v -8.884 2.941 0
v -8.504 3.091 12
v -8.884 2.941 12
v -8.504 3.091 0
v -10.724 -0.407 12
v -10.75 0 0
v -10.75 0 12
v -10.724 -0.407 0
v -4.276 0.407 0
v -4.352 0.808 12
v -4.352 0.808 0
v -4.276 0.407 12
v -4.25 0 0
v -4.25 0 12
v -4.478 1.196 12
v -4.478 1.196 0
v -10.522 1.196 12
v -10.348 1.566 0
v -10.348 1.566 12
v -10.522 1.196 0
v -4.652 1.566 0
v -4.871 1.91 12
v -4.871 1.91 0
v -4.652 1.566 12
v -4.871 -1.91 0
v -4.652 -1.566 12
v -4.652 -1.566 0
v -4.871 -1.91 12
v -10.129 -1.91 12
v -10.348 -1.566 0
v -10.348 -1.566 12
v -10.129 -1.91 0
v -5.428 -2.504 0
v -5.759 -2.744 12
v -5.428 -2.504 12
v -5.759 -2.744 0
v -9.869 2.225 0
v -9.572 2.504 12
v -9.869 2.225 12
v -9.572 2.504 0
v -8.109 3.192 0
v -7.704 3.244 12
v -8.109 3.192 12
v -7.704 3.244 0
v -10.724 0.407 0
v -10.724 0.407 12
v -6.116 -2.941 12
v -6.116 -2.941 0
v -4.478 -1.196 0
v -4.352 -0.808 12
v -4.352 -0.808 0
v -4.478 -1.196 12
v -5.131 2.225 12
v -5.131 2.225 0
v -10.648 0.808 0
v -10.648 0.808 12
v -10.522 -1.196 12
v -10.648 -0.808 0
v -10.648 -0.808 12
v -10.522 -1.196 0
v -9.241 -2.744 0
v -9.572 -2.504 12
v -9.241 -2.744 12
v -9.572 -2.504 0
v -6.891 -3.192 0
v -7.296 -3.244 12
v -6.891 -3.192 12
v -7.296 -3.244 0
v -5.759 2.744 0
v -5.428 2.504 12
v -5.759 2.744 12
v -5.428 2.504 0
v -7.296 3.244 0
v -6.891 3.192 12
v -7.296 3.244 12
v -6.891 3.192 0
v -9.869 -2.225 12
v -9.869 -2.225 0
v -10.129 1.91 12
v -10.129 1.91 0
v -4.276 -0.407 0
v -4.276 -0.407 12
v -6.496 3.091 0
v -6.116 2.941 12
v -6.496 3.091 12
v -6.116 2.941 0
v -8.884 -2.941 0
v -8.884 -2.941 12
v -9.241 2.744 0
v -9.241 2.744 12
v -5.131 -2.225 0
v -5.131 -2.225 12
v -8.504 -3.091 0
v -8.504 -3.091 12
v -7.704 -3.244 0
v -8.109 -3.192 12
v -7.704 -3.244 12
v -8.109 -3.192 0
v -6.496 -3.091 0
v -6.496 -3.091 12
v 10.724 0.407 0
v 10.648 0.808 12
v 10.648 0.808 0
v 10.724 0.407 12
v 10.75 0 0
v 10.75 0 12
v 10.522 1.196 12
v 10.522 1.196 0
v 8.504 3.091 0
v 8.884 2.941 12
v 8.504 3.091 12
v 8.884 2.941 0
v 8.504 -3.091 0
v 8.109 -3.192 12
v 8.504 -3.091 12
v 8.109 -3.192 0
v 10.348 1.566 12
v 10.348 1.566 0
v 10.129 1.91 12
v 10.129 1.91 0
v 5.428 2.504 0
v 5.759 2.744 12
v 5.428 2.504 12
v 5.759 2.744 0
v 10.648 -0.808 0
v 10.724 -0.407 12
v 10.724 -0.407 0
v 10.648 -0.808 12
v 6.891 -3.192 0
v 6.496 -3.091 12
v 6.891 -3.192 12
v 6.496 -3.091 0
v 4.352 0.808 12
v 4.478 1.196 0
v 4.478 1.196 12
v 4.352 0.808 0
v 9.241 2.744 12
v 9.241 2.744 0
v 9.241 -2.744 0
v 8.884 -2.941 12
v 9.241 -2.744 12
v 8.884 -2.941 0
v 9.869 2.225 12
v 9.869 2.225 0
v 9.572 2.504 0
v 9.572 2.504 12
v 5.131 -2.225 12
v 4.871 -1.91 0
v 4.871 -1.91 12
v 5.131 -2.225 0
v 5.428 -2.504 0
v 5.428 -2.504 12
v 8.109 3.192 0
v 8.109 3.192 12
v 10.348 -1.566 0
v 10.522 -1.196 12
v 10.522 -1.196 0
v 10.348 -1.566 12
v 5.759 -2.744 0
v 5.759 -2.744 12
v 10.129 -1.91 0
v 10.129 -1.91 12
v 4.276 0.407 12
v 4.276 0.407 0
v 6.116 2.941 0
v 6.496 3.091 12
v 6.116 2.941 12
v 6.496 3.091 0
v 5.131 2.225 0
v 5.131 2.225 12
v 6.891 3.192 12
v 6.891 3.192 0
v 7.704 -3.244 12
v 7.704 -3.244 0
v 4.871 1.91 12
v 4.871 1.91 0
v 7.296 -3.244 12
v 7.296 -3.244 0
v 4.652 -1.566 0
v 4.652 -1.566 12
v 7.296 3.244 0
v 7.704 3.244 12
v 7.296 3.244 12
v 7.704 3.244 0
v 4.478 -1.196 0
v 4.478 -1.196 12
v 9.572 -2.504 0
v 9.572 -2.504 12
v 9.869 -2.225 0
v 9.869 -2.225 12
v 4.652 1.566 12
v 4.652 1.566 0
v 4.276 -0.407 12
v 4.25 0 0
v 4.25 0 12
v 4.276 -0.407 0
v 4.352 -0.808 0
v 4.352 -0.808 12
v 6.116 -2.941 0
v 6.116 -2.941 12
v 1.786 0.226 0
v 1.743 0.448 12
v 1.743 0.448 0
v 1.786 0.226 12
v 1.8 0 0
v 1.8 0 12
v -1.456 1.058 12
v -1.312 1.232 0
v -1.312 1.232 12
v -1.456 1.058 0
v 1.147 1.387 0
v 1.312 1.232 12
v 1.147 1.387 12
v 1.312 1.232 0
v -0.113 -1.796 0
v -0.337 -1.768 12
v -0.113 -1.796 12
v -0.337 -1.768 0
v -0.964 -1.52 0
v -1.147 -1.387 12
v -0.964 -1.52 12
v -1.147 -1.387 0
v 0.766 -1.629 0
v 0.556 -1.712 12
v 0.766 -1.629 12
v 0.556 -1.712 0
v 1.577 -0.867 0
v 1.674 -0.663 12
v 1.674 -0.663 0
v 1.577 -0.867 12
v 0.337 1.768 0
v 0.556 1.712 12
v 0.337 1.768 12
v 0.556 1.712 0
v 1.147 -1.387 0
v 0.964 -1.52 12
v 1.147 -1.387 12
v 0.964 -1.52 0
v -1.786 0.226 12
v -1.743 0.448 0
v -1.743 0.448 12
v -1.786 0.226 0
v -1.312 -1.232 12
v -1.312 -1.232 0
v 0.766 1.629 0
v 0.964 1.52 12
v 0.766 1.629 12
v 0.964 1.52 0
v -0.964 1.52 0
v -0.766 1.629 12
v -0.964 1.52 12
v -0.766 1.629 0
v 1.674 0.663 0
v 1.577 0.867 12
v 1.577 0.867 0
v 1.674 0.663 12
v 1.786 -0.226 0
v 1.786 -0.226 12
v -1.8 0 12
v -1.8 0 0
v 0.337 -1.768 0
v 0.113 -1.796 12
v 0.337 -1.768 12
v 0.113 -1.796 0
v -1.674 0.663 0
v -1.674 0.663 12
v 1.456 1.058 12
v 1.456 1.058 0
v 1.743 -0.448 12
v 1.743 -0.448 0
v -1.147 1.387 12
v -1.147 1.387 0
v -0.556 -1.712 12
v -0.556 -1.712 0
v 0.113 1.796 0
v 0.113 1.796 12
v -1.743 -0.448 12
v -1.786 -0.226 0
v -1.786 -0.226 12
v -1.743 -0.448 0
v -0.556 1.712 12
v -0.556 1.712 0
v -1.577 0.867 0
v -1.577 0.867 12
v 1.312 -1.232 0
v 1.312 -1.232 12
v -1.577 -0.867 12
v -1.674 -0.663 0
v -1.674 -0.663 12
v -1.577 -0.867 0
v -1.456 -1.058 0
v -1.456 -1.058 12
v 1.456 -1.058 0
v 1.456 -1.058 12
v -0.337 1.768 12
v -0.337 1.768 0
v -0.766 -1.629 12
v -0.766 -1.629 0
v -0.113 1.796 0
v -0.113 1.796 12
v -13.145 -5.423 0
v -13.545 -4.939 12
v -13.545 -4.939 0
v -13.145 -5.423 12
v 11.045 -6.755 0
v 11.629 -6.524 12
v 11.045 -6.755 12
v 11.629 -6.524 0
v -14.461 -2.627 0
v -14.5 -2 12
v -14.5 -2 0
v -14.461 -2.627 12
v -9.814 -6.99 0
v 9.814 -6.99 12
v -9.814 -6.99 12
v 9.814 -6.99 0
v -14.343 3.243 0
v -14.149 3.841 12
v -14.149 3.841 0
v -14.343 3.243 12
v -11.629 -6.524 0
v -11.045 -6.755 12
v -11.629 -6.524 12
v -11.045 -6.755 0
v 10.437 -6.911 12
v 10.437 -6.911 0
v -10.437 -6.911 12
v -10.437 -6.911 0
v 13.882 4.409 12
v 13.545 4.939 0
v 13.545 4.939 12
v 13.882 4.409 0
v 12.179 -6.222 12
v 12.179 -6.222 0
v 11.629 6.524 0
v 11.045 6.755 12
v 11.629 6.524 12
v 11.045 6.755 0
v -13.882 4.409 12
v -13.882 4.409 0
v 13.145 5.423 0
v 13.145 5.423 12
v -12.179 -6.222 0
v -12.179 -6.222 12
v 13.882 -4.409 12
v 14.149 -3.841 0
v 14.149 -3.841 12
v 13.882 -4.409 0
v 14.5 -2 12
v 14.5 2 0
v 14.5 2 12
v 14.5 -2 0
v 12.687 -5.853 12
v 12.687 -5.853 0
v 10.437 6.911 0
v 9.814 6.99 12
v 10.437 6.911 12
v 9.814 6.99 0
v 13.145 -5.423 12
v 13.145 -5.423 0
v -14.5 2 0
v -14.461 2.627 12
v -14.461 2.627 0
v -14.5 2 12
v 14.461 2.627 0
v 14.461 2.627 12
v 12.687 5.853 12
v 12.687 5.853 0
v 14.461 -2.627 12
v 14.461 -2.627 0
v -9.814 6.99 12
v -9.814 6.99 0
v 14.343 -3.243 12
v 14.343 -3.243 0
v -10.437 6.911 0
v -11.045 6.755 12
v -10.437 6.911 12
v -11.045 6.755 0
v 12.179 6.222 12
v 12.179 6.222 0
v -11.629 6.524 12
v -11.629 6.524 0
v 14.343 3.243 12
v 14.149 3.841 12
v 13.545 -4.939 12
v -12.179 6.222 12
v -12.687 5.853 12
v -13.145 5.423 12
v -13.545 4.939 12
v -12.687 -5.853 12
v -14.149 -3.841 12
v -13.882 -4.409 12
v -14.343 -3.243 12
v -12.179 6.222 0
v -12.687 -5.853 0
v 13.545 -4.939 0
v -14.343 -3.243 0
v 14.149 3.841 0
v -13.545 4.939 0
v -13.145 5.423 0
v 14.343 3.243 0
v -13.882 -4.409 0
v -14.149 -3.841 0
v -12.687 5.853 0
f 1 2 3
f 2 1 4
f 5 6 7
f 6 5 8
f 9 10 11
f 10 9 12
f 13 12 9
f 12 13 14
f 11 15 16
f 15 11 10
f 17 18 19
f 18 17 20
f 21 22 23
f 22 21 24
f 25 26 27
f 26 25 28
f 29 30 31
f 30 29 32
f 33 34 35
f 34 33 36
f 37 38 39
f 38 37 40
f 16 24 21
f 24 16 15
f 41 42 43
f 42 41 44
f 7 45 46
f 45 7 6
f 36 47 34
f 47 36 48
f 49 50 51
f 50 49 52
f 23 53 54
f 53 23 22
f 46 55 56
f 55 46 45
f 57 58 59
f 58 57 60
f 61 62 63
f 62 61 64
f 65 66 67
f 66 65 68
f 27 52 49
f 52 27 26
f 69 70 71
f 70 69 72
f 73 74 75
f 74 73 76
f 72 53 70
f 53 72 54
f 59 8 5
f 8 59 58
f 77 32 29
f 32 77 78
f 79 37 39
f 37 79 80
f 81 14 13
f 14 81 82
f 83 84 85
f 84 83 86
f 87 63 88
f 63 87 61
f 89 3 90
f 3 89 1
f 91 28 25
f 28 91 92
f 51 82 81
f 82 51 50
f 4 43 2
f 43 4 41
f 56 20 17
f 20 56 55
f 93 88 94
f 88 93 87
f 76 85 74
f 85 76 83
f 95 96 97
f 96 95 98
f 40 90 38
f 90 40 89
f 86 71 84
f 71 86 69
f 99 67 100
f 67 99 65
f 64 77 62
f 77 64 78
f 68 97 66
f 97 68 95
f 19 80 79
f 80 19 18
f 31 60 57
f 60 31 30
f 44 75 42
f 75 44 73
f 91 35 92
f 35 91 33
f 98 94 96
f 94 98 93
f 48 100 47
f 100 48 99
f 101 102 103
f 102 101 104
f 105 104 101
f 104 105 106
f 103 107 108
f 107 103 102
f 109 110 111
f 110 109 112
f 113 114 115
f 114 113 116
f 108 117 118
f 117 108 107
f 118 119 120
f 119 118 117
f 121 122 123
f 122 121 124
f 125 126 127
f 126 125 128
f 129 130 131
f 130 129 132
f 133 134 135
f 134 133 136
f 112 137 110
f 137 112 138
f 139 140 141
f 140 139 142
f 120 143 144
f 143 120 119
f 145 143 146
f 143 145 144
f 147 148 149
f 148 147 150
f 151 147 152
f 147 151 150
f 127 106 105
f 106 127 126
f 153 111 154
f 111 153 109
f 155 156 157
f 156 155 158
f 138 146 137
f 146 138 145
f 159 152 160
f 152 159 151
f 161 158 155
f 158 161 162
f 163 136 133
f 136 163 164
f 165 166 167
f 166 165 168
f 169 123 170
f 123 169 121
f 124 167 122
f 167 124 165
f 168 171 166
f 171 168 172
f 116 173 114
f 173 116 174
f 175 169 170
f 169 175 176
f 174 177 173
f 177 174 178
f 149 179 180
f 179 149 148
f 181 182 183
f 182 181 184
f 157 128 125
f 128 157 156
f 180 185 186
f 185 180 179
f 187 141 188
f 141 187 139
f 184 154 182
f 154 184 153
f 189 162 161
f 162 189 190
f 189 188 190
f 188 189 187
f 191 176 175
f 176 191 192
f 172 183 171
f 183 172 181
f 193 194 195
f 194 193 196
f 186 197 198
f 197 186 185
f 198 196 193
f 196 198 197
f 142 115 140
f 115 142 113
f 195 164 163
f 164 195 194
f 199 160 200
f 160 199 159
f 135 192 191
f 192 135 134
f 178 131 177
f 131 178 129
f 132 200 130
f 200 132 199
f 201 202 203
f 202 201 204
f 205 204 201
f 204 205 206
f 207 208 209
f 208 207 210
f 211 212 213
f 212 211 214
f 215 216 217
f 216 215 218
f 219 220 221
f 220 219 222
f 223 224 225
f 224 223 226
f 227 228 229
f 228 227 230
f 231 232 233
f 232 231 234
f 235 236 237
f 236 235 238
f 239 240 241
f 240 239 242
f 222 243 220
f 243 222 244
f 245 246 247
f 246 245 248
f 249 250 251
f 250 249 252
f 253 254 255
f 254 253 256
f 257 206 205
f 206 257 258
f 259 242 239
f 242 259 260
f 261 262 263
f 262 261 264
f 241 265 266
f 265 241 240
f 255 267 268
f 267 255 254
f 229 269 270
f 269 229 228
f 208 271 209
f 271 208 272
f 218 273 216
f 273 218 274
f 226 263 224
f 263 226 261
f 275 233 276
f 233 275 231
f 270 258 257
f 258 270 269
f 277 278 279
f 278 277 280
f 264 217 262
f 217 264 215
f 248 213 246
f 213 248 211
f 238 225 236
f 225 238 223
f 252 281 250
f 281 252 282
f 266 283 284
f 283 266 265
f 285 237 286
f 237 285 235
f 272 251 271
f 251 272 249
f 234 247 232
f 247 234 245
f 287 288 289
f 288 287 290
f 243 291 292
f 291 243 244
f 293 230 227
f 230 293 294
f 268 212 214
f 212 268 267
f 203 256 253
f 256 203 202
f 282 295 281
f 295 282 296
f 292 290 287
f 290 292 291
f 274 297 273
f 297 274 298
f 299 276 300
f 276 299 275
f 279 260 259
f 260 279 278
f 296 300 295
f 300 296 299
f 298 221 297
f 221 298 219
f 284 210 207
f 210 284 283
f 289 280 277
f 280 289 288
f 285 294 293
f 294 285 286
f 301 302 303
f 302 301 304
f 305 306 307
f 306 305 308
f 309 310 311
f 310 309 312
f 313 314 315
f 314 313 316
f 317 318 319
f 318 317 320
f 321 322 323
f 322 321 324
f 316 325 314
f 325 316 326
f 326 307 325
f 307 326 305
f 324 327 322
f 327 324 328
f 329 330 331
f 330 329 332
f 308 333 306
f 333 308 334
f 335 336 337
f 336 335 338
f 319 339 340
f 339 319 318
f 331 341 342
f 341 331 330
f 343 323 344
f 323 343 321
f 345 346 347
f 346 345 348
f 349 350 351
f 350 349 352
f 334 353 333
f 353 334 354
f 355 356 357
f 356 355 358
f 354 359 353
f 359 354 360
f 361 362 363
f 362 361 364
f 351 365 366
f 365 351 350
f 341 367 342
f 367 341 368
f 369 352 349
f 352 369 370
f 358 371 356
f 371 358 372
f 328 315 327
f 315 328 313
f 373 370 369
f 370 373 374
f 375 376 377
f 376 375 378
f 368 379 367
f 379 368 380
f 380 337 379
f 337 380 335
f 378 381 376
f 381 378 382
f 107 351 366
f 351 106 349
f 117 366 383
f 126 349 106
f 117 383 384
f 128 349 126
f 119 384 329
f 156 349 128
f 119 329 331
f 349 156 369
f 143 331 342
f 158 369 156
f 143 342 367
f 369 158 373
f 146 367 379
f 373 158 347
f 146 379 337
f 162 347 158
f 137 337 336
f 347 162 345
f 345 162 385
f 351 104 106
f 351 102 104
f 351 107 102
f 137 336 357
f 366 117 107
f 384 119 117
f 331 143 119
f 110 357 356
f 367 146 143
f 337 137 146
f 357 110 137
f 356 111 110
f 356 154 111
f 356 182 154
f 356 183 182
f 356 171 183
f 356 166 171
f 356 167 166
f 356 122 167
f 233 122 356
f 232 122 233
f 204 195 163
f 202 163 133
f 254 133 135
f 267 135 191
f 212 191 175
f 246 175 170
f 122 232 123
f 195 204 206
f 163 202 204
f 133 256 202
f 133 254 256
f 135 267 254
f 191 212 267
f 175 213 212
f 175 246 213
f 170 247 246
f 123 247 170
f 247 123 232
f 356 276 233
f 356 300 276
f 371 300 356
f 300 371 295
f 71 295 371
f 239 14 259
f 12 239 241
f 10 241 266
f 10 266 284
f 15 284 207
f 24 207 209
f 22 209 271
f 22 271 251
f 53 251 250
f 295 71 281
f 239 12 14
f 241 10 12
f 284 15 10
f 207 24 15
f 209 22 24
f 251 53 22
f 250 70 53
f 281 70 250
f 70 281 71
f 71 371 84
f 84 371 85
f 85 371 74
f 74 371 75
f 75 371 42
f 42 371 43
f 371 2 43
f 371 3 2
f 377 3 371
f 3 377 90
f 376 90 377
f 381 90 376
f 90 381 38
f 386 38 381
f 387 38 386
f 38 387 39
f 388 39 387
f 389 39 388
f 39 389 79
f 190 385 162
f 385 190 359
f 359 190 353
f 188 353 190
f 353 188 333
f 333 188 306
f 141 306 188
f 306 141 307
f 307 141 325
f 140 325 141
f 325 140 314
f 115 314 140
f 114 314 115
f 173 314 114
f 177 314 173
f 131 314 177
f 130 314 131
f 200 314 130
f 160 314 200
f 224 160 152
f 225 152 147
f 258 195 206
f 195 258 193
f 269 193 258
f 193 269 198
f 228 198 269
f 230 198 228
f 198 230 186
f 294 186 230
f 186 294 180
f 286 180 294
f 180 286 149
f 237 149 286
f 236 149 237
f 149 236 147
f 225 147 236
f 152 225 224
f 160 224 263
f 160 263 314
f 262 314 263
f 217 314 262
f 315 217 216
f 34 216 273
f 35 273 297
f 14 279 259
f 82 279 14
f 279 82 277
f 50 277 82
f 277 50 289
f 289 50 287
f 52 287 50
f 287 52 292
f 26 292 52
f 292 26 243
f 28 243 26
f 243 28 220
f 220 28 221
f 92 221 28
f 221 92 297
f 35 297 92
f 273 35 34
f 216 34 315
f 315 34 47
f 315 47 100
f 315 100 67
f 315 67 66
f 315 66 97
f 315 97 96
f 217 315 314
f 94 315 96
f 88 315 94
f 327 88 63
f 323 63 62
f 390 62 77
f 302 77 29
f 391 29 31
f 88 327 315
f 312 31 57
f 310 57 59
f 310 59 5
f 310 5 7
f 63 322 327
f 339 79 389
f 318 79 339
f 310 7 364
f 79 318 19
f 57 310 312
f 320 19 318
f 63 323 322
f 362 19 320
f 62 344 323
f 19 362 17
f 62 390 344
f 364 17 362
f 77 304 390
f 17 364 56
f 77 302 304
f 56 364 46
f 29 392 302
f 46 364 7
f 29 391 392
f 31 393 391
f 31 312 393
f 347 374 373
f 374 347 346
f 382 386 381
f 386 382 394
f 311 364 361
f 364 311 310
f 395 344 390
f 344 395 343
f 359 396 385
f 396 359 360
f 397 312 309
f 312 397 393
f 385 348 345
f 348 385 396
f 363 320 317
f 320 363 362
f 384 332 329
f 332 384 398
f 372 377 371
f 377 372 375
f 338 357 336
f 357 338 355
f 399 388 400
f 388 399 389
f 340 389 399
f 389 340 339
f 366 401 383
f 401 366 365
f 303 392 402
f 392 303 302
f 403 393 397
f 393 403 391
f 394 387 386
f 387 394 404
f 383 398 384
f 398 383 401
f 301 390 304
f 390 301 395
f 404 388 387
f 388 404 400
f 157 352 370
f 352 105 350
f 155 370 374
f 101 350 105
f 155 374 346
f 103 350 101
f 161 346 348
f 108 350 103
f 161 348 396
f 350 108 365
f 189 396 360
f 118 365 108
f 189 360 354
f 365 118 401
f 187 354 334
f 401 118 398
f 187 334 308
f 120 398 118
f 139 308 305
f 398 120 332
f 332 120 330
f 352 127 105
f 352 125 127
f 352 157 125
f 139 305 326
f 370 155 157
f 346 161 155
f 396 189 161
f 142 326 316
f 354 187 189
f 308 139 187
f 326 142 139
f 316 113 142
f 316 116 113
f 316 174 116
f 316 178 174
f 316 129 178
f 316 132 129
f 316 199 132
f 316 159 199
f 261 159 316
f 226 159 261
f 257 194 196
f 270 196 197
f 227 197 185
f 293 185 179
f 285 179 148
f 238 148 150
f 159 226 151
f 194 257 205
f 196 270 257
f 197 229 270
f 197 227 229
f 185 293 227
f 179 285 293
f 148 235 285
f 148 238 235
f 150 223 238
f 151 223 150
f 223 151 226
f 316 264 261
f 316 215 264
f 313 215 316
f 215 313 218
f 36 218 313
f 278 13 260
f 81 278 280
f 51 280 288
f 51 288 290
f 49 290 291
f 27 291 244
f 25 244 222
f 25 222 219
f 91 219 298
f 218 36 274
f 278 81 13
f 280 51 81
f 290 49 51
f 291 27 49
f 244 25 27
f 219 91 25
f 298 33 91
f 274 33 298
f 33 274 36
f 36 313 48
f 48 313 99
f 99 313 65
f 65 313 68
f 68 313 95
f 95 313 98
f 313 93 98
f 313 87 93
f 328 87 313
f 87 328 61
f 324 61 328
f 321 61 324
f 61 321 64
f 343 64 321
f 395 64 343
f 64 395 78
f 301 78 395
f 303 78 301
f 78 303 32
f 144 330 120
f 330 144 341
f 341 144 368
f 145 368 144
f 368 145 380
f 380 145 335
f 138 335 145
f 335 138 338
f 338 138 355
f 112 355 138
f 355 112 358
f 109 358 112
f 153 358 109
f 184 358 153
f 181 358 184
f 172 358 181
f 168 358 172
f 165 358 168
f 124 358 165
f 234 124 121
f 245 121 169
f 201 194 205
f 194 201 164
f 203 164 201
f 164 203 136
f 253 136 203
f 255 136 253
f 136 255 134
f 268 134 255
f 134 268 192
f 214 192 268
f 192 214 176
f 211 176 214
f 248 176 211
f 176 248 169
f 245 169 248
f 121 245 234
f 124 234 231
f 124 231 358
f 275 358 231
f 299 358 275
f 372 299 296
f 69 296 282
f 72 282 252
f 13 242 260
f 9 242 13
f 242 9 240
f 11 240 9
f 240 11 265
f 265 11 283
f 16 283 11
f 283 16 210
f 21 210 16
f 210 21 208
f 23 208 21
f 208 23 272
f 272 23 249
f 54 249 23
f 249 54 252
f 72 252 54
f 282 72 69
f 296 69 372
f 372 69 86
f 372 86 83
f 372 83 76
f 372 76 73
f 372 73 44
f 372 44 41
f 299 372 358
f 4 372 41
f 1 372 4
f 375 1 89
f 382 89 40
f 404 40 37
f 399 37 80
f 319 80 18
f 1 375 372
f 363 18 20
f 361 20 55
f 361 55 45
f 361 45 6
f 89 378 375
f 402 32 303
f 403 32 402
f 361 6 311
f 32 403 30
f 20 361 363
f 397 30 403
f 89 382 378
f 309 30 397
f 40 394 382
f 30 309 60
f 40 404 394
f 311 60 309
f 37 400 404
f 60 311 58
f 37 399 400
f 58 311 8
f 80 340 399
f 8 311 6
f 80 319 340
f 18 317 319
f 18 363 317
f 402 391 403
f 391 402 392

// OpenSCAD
$fn = 50;


difference() {
	union() {
		*color(alpha = 1.0000000000, c = "gray") {
			translate(v = [0, 7, 0]) {
				linear_extrude(height = 1) {
					text(font = "Arial:style=Bold", halign = "center", size = 4.5000000000, text = "COMMENT plate main", valign = "center");
				}
			}
		}
		hull() {
			translate(v = [-9.5000000000, 2.0000000000, 0]) {
				cylinder(h = 12, r = 5);
			}
			translate(v = [9.5000000000, 2.0000000000, 0]) {
				cylinder(h = 12, r = 5);
			}
			translate(v = [-9.5000000000, -2.0000000000, 0]) {
				cylinder(h = 12, r = 5);
			}
			translate(v = [9.5000000000, -2.0000000000, 0]) {
				cylinder(h = 12, r = 5);
			}
		}
	}
	union() {
		*color(alpha = 1.0000000000, c = "gray") {
			translate(v = [0, 7, 0]) {
				linear_extrude(height = 1) {
					text(font = "Arial:style=Bold", halign = "center", size = 4.5000000000, text = "COMMENT holes main", valign = "center");
				}
			}
		}
		translate(v = [-7.5000000000, 0.0000000000, 0]) {
			translate(v = [0, 0, -100]) {
				cylinder(h = 200, r = 3.2500000000);
			}
		}
		translate(v = [7.5000000000, 0.0000000000, 0]) {
			translate(v = [0, 0, -100]) {
				cylinder(h = 200, r = 3.2500000000);
			}
		}
		translate(v = [-7.5000000000, 0.0000000000, 0]) {
			translate(v = [0, 0, -100]) {
				cylinder(h = 200, r = 1.8000000000);
			}
		}
		translate(v = [0, 0, -100]) {
			cylinder(h = 200, r = 1.8000000000);
		}
		translate(v = [7.5000000000, 0.0000000000, 0]) {
			translate(v = [0, 0, -100]) {
				cylinder(h = 200, r = 1.8000000000);
			}
		}
	}
}
